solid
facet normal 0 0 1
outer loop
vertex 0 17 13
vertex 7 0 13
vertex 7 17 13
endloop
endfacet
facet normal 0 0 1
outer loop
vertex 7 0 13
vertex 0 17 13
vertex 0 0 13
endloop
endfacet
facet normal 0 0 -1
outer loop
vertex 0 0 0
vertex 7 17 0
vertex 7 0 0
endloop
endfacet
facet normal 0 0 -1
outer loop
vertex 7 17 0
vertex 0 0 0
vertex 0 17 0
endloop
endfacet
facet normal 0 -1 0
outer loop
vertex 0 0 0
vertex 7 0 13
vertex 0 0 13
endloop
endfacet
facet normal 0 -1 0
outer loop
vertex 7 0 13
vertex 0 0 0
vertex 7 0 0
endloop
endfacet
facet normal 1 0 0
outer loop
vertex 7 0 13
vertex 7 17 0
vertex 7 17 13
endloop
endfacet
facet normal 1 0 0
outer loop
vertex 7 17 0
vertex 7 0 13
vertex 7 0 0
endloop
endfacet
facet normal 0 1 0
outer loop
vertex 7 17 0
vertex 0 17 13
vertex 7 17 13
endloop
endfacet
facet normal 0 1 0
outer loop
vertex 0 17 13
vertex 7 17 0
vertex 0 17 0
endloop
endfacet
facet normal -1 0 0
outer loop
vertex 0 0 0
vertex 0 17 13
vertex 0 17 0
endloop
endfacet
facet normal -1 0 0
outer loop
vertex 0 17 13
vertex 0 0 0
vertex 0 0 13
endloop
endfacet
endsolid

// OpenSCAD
// Generated by SolidPython 1.0.1 on 2020-07-29 00:46:55


cube(size = [7, 17, 13]);
/***********************************************
*********      SolidPython code:      **********
************************************************
 
# import packages: SolidPython
from solid import *
from solid.utils import *
from itertools import chain, combinations, permutations


class Resize:

    def __init__(self, scad_file):
        self.scad_file = scad_file
        #self.scad_file = import_scad(scad_file)
        # cone/cylinder param:
        self.r1 = 0
        self.r2 = 0
        self.h = 0
        # rectangular prism param:
        self.w = 0
        self.l = 0
        # ellipse param:
        self.r = 0

    # import OpenScad code (file name corresponds to shape)


    # classify shape + parameters
    def assign(self, param1, param2, param3):
        if self.scad_file == 'cone.scad':
            self.r1 = param1
            self.r2 = param2
            self.h = param3
        elif self.scad_file == 'cylinder.scad':
            self.r1 = param1
            self.r2 = param2
            self.h = param3
        elif self.scad_file == 'rectangularPrism.scad':
            self.h = param1
            self.l = param2
            self.w = param3
        else:
            self.r = param1
            self.h = param2

    # resize parameters
    def iterate(self):
        x = range(3, 20, 2)
        i = 1
        if self.scad_file == 'cone.scad':
            tempList = list(permutations(x, 2))
            for temp in tempList:
                param1 = temp[0]
                param2 = temp[1]
                filepath = 'produced_scad_files/' + 'cone' + str(param1) + '_' + str(param2) + '_' + '.scad'
                scad_render_to_file(cylinder(h=param1, r1=param2, r2=0), filepath)

        elif self.scad_file == 'cylinder.scad':
            tempList = list(permutations(x, 3))
            for temp in tempList:
                param1 = temp[0]
                param2 = temp[1]
                filepath = 'produced_scad_files/' + 'cylinder' + str(param1) + '_' + str(param2) + '_' + '.scad'
                scad_render_to_file(cylinder(h=param1, r1=param2, r2=param2), filepath)

        elif self.scad_file == 'rectangularPrism.scad':
            tempList = list(permutations(x, 3))
            for temp in tempList:
                param1 = temp[0]
                param2 = temp[1]
                param3 = temp[2]
                filepath = 'produced_scad_files/' + 'rectangularPrism' + str(param1) + '_' + str(param2) + '_' + str(
                    param3) + '.scad'
                scad_render_to_file(cube(size=(param1, param2, param3)), filepath)

        elif self.scad_file == 'ellipse.scad':
            tempList = list(permutations(x, 4))
            for temp in tempList:
                param1 = temp[0]
                param2 = temp[1]
                param3 = temp[2]
                param4 = temp[3]
                filepath = 'produced_scad_files/' + 'ellipse' + str(param1) + '_' + str(param2) + '_' + str(param3) + '_' + str(param4) + '.scad'
                scad_render_to_file(scale([param1, param2, param3])(sphere(r=param4)), filepath)

    def render_to_scadfile(self):
        scad_render_to_file(scad, 'example.scad') 
 
************************************************/
